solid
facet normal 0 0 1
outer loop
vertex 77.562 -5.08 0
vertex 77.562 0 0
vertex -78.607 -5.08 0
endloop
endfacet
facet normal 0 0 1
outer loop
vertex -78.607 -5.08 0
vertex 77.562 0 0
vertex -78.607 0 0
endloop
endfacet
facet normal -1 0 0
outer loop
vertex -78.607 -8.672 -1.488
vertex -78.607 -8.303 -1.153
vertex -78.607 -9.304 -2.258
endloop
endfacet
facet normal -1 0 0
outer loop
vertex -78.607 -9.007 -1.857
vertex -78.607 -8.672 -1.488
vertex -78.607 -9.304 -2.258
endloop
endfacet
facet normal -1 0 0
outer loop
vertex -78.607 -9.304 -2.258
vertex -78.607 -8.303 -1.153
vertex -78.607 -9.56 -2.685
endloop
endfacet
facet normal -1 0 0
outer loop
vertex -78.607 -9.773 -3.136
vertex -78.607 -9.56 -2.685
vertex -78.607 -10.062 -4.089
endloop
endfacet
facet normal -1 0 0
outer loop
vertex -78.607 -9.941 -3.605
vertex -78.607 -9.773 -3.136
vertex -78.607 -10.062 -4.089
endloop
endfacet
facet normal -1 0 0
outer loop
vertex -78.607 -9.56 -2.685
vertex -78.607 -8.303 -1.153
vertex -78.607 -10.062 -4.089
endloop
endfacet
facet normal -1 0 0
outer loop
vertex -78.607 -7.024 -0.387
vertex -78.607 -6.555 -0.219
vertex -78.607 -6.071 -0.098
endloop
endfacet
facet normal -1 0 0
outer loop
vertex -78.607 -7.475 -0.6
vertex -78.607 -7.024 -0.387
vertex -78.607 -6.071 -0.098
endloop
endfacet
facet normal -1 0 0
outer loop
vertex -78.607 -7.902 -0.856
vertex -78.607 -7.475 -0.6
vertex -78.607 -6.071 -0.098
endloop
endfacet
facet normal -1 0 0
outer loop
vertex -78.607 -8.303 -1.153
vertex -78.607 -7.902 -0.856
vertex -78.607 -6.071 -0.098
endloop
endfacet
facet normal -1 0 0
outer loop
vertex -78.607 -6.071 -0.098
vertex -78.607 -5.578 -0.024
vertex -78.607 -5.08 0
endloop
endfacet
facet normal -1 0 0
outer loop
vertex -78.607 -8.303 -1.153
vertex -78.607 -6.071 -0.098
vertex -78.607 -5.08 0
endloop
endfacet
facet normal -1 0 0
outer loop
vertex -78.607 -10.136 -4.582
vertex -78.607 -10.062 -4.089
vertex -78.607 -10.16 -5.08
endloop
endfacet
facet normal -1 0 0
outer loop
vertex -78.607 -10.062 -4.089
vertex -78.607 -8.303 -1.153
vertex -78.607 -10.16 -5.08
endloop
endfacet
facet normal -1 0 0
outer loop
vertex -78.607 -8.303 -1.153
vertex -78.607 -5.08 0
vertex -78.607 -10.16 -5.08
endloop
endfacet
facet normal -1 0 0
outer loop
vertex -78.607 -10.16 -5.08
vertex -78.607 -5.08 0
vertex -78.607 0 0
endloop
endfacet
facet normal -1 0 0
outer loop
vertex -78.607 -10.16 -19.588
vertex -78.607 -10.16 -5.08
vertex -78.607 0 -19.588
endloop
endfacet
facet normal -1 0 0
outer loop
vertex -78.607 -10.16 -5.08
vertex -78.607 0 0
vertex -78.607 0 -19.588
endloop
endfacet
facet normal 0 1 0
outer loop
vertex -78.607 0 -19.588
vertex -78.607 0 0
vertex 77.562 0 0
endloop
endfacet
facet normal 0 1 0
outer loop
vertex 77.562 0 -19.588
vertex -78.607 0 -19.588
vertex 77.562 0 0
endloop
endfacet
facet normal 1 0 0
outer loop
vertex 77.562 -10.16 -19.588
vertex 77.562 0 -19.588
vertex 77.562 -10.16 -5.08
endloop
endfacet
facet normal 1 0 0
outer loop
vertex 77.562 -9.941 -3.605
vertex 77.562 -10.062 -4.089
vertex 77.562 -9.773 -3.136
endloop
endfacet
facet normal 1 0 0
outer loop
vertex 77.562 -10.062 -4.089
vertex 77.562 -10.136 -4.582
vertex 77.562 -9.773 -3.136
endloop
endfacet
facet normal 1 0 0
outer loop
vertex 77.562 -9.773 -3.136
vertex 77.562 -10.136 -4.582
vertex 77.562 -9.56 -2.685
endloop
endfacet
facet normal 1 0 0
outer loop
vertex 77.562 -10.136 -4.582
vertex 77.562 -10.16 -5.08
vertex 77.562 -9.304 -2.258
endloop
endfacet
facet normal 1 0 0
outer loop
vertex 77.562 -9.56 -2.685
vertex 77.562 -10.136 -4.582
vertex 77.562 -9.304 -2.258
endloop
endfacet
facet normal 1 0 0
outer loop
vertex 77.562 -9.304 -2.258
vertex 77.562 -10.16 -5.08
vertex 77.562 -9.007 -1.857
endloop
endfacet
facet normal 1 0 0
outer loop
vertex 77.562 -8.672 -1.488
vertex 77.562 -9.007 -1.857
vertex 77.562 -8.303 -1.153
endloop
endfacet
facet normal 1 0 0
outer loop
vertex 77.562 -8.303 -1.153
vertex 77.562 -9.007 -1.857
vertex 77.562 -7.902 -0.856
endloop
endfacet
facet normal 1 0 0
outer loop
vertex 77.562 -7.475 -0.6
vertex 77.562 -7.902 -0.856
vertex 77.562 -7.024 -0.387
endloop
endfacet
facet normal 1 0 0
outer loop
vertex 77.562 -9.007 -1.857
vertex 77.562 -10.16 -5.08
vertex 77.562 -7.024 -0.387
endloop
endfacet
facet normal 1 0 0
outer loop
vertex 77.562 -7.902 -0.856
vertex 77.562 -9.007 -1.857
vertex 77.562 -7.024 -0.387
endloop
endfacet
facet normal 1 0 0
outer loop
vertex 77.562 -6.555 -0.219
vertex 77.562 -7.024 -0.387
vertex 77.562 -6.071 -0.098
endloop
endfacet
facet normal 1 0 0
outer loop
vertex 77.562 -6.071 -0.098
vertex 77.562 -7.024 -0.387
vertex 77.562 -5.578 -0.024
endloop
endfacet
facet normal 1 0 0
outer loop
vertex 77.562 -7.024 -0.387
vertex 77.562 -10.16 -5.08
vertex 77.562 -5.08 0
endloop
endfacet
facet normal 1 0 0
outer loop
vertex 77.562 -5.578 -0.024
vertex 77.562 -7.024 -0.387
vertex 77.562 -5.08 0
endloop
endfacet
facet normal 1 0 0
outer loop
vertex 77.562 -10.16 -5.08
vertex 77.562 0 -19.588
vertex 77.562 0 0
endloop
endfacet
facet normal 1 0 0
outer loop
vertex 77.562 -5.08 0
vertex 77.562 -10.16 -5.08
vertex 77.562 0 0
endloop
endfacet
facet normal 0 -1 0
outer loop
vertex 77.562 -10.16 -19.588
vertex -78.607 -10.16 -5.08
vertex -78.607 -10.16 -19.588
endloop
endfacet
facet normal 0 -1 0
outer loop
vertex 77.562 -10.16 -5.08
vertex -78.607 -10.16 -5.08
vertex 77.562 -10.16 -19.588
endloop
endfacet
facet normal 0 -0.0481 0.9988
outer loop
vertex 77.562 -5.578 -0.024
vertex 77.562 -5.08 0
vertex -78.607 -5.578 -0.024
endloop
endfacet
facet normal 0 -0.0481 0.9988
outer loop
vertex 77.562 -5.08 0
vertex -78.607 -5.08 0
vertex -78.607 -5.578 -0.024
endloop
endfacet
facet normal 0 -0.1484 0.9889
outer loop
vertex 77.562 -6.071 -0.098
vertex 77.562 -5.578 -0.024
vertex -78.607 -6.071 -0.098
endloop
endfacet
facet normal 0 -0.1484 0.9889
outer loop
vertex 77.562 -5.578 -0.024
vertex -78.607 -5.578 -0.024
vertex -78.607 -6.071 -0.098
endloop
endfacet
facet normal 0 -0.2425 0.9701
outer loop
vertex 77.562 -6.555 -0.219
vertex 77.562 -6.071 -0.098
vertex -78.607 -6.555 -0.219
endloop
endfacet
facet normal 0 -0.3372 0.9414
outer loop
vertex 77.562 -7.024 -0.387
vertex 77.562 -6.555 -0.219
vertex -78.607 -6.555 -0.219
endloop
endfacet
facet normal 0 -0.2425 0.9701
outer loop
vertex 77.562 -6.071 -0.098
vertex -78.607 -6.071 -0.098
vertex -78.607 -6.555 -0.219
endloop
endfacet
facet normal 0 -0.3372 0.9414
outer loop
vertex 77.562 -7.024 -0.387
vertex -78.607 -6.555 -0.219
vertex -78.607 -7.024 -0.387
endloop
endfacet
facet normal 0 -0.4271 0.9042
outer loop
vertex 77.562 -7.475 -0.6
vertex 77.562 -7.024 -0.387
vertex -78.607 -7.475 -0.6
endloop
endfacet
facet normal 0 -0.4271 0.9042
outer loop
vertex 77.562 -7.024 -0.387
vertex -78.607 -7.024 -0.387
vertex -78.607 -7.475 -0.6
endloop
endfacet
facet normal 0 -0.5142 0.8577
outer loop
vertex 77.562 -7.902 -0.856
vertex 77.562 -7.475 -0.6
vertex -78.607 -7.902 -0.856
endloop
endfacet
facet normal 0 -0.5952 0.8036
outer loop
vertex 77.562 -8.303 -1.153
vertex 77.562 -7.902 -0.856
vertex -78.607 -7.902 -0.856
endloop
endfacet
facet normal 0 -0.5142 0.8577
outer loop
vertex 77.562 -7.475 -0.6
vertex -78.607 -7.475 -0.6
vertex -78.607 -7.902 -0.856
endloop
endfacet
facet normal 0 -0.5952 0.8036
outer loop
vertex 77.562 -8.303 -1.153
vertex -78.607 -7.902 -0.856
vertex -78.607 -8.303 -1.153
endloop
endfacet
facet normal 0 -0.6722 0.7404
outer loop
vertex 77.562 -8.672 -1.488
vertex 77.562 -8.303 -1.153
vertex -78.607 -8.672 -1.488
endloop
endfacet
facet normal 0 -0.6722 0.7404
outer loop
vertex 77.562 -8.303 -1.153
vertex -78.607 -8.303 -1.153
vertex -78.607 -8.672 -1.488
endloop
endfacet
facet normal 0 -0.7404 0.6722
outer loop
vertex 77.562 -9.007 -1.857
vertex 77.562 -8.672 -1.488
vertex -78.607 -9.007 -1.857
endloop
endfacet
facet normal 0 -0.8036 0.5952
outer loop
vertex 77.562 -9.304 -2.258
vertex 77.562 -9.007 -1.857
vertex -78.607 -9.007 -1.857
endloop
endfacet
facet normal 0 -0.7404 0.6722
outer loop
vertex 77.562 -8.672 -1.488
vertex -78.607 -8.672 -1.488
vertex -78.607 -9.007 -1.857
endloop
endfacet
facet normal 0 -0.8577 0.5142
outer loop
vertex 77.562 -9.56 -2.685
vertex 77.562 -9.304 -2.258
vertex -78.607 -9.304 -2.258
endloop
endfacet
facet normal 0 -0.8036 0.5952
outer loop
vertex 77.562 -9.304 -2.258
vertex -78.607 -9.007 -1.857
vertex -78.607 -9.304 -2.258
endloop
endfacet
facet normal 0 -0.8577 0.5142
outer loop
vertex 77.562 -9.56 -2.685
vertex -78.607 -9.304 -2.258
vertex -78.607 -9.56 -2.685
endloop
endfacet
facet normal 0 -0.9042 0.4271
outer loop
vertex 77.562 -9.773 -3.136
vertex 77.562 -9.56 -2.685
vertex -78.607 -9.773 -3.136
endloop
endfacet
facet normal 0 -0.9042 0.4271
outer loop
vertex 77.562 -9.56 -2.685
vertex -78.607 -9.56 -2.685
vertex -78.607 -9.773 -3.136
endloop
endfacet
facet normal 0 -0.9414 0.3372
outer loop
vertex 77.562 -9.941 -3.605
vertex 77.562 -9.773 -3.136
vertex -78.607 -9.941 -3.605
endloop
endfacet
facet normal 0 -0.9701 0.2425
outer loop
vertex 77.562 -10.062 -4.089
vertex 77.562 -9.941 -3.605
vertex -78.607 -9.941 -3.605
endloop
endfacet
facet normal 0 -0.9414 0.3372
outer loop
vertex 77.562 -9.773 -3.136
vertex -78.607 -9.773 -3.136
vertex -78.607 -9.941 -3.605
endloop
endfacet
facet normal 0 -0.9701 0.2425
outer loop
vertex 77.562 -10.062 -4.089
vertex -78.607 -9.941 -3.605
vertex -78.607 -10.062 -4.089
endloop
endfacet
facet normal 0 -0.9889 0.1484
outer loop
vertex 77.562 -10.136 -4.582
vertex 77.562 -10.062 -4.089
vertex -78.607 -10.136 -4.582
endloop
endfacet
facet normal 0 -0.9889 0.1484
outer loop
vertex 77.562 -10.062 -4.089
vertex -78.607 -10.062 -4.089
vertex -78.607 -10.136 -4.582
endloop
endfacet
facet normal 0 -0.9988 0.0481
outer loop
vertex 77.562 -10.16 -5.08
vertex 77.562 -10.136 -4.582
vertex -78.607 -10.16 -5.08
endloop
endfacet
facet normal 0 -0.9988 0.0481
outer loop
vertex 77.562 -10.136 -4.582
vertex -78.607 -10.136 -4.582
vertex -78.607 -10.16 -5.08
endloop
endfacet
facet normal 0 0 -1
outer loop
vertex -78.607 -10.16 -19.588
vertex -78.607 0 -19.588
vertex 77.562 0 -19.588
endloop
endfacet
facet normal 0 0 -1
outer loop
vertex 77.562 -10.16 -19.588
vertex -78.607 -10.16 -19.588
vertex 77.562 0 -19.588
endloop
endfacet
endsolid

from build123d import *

# Parameters (mm, degrees)
F1_DEPTH = 10.16
F2_R     = 5.08


with BuildPart() as f1:
    # F0 (on Front) → F1 (new body)
    with BuildSketch(Plane.XZ):
        Polygon((77.562474, 0), (0, 0), (-78.607082, 0), (-78.607082, -19.587653), (77.562474, -19.587653), align=None)
    extrude(amount=F1_DEPTH)

    # F2
    f2_edges = [f1.edges().sort_by_distance(p)[0] for p in [
        (-0.522304, -10.16, 0),
    ]]
    fillet(f2_edges, radius=F2_R)


solid = f1.part
